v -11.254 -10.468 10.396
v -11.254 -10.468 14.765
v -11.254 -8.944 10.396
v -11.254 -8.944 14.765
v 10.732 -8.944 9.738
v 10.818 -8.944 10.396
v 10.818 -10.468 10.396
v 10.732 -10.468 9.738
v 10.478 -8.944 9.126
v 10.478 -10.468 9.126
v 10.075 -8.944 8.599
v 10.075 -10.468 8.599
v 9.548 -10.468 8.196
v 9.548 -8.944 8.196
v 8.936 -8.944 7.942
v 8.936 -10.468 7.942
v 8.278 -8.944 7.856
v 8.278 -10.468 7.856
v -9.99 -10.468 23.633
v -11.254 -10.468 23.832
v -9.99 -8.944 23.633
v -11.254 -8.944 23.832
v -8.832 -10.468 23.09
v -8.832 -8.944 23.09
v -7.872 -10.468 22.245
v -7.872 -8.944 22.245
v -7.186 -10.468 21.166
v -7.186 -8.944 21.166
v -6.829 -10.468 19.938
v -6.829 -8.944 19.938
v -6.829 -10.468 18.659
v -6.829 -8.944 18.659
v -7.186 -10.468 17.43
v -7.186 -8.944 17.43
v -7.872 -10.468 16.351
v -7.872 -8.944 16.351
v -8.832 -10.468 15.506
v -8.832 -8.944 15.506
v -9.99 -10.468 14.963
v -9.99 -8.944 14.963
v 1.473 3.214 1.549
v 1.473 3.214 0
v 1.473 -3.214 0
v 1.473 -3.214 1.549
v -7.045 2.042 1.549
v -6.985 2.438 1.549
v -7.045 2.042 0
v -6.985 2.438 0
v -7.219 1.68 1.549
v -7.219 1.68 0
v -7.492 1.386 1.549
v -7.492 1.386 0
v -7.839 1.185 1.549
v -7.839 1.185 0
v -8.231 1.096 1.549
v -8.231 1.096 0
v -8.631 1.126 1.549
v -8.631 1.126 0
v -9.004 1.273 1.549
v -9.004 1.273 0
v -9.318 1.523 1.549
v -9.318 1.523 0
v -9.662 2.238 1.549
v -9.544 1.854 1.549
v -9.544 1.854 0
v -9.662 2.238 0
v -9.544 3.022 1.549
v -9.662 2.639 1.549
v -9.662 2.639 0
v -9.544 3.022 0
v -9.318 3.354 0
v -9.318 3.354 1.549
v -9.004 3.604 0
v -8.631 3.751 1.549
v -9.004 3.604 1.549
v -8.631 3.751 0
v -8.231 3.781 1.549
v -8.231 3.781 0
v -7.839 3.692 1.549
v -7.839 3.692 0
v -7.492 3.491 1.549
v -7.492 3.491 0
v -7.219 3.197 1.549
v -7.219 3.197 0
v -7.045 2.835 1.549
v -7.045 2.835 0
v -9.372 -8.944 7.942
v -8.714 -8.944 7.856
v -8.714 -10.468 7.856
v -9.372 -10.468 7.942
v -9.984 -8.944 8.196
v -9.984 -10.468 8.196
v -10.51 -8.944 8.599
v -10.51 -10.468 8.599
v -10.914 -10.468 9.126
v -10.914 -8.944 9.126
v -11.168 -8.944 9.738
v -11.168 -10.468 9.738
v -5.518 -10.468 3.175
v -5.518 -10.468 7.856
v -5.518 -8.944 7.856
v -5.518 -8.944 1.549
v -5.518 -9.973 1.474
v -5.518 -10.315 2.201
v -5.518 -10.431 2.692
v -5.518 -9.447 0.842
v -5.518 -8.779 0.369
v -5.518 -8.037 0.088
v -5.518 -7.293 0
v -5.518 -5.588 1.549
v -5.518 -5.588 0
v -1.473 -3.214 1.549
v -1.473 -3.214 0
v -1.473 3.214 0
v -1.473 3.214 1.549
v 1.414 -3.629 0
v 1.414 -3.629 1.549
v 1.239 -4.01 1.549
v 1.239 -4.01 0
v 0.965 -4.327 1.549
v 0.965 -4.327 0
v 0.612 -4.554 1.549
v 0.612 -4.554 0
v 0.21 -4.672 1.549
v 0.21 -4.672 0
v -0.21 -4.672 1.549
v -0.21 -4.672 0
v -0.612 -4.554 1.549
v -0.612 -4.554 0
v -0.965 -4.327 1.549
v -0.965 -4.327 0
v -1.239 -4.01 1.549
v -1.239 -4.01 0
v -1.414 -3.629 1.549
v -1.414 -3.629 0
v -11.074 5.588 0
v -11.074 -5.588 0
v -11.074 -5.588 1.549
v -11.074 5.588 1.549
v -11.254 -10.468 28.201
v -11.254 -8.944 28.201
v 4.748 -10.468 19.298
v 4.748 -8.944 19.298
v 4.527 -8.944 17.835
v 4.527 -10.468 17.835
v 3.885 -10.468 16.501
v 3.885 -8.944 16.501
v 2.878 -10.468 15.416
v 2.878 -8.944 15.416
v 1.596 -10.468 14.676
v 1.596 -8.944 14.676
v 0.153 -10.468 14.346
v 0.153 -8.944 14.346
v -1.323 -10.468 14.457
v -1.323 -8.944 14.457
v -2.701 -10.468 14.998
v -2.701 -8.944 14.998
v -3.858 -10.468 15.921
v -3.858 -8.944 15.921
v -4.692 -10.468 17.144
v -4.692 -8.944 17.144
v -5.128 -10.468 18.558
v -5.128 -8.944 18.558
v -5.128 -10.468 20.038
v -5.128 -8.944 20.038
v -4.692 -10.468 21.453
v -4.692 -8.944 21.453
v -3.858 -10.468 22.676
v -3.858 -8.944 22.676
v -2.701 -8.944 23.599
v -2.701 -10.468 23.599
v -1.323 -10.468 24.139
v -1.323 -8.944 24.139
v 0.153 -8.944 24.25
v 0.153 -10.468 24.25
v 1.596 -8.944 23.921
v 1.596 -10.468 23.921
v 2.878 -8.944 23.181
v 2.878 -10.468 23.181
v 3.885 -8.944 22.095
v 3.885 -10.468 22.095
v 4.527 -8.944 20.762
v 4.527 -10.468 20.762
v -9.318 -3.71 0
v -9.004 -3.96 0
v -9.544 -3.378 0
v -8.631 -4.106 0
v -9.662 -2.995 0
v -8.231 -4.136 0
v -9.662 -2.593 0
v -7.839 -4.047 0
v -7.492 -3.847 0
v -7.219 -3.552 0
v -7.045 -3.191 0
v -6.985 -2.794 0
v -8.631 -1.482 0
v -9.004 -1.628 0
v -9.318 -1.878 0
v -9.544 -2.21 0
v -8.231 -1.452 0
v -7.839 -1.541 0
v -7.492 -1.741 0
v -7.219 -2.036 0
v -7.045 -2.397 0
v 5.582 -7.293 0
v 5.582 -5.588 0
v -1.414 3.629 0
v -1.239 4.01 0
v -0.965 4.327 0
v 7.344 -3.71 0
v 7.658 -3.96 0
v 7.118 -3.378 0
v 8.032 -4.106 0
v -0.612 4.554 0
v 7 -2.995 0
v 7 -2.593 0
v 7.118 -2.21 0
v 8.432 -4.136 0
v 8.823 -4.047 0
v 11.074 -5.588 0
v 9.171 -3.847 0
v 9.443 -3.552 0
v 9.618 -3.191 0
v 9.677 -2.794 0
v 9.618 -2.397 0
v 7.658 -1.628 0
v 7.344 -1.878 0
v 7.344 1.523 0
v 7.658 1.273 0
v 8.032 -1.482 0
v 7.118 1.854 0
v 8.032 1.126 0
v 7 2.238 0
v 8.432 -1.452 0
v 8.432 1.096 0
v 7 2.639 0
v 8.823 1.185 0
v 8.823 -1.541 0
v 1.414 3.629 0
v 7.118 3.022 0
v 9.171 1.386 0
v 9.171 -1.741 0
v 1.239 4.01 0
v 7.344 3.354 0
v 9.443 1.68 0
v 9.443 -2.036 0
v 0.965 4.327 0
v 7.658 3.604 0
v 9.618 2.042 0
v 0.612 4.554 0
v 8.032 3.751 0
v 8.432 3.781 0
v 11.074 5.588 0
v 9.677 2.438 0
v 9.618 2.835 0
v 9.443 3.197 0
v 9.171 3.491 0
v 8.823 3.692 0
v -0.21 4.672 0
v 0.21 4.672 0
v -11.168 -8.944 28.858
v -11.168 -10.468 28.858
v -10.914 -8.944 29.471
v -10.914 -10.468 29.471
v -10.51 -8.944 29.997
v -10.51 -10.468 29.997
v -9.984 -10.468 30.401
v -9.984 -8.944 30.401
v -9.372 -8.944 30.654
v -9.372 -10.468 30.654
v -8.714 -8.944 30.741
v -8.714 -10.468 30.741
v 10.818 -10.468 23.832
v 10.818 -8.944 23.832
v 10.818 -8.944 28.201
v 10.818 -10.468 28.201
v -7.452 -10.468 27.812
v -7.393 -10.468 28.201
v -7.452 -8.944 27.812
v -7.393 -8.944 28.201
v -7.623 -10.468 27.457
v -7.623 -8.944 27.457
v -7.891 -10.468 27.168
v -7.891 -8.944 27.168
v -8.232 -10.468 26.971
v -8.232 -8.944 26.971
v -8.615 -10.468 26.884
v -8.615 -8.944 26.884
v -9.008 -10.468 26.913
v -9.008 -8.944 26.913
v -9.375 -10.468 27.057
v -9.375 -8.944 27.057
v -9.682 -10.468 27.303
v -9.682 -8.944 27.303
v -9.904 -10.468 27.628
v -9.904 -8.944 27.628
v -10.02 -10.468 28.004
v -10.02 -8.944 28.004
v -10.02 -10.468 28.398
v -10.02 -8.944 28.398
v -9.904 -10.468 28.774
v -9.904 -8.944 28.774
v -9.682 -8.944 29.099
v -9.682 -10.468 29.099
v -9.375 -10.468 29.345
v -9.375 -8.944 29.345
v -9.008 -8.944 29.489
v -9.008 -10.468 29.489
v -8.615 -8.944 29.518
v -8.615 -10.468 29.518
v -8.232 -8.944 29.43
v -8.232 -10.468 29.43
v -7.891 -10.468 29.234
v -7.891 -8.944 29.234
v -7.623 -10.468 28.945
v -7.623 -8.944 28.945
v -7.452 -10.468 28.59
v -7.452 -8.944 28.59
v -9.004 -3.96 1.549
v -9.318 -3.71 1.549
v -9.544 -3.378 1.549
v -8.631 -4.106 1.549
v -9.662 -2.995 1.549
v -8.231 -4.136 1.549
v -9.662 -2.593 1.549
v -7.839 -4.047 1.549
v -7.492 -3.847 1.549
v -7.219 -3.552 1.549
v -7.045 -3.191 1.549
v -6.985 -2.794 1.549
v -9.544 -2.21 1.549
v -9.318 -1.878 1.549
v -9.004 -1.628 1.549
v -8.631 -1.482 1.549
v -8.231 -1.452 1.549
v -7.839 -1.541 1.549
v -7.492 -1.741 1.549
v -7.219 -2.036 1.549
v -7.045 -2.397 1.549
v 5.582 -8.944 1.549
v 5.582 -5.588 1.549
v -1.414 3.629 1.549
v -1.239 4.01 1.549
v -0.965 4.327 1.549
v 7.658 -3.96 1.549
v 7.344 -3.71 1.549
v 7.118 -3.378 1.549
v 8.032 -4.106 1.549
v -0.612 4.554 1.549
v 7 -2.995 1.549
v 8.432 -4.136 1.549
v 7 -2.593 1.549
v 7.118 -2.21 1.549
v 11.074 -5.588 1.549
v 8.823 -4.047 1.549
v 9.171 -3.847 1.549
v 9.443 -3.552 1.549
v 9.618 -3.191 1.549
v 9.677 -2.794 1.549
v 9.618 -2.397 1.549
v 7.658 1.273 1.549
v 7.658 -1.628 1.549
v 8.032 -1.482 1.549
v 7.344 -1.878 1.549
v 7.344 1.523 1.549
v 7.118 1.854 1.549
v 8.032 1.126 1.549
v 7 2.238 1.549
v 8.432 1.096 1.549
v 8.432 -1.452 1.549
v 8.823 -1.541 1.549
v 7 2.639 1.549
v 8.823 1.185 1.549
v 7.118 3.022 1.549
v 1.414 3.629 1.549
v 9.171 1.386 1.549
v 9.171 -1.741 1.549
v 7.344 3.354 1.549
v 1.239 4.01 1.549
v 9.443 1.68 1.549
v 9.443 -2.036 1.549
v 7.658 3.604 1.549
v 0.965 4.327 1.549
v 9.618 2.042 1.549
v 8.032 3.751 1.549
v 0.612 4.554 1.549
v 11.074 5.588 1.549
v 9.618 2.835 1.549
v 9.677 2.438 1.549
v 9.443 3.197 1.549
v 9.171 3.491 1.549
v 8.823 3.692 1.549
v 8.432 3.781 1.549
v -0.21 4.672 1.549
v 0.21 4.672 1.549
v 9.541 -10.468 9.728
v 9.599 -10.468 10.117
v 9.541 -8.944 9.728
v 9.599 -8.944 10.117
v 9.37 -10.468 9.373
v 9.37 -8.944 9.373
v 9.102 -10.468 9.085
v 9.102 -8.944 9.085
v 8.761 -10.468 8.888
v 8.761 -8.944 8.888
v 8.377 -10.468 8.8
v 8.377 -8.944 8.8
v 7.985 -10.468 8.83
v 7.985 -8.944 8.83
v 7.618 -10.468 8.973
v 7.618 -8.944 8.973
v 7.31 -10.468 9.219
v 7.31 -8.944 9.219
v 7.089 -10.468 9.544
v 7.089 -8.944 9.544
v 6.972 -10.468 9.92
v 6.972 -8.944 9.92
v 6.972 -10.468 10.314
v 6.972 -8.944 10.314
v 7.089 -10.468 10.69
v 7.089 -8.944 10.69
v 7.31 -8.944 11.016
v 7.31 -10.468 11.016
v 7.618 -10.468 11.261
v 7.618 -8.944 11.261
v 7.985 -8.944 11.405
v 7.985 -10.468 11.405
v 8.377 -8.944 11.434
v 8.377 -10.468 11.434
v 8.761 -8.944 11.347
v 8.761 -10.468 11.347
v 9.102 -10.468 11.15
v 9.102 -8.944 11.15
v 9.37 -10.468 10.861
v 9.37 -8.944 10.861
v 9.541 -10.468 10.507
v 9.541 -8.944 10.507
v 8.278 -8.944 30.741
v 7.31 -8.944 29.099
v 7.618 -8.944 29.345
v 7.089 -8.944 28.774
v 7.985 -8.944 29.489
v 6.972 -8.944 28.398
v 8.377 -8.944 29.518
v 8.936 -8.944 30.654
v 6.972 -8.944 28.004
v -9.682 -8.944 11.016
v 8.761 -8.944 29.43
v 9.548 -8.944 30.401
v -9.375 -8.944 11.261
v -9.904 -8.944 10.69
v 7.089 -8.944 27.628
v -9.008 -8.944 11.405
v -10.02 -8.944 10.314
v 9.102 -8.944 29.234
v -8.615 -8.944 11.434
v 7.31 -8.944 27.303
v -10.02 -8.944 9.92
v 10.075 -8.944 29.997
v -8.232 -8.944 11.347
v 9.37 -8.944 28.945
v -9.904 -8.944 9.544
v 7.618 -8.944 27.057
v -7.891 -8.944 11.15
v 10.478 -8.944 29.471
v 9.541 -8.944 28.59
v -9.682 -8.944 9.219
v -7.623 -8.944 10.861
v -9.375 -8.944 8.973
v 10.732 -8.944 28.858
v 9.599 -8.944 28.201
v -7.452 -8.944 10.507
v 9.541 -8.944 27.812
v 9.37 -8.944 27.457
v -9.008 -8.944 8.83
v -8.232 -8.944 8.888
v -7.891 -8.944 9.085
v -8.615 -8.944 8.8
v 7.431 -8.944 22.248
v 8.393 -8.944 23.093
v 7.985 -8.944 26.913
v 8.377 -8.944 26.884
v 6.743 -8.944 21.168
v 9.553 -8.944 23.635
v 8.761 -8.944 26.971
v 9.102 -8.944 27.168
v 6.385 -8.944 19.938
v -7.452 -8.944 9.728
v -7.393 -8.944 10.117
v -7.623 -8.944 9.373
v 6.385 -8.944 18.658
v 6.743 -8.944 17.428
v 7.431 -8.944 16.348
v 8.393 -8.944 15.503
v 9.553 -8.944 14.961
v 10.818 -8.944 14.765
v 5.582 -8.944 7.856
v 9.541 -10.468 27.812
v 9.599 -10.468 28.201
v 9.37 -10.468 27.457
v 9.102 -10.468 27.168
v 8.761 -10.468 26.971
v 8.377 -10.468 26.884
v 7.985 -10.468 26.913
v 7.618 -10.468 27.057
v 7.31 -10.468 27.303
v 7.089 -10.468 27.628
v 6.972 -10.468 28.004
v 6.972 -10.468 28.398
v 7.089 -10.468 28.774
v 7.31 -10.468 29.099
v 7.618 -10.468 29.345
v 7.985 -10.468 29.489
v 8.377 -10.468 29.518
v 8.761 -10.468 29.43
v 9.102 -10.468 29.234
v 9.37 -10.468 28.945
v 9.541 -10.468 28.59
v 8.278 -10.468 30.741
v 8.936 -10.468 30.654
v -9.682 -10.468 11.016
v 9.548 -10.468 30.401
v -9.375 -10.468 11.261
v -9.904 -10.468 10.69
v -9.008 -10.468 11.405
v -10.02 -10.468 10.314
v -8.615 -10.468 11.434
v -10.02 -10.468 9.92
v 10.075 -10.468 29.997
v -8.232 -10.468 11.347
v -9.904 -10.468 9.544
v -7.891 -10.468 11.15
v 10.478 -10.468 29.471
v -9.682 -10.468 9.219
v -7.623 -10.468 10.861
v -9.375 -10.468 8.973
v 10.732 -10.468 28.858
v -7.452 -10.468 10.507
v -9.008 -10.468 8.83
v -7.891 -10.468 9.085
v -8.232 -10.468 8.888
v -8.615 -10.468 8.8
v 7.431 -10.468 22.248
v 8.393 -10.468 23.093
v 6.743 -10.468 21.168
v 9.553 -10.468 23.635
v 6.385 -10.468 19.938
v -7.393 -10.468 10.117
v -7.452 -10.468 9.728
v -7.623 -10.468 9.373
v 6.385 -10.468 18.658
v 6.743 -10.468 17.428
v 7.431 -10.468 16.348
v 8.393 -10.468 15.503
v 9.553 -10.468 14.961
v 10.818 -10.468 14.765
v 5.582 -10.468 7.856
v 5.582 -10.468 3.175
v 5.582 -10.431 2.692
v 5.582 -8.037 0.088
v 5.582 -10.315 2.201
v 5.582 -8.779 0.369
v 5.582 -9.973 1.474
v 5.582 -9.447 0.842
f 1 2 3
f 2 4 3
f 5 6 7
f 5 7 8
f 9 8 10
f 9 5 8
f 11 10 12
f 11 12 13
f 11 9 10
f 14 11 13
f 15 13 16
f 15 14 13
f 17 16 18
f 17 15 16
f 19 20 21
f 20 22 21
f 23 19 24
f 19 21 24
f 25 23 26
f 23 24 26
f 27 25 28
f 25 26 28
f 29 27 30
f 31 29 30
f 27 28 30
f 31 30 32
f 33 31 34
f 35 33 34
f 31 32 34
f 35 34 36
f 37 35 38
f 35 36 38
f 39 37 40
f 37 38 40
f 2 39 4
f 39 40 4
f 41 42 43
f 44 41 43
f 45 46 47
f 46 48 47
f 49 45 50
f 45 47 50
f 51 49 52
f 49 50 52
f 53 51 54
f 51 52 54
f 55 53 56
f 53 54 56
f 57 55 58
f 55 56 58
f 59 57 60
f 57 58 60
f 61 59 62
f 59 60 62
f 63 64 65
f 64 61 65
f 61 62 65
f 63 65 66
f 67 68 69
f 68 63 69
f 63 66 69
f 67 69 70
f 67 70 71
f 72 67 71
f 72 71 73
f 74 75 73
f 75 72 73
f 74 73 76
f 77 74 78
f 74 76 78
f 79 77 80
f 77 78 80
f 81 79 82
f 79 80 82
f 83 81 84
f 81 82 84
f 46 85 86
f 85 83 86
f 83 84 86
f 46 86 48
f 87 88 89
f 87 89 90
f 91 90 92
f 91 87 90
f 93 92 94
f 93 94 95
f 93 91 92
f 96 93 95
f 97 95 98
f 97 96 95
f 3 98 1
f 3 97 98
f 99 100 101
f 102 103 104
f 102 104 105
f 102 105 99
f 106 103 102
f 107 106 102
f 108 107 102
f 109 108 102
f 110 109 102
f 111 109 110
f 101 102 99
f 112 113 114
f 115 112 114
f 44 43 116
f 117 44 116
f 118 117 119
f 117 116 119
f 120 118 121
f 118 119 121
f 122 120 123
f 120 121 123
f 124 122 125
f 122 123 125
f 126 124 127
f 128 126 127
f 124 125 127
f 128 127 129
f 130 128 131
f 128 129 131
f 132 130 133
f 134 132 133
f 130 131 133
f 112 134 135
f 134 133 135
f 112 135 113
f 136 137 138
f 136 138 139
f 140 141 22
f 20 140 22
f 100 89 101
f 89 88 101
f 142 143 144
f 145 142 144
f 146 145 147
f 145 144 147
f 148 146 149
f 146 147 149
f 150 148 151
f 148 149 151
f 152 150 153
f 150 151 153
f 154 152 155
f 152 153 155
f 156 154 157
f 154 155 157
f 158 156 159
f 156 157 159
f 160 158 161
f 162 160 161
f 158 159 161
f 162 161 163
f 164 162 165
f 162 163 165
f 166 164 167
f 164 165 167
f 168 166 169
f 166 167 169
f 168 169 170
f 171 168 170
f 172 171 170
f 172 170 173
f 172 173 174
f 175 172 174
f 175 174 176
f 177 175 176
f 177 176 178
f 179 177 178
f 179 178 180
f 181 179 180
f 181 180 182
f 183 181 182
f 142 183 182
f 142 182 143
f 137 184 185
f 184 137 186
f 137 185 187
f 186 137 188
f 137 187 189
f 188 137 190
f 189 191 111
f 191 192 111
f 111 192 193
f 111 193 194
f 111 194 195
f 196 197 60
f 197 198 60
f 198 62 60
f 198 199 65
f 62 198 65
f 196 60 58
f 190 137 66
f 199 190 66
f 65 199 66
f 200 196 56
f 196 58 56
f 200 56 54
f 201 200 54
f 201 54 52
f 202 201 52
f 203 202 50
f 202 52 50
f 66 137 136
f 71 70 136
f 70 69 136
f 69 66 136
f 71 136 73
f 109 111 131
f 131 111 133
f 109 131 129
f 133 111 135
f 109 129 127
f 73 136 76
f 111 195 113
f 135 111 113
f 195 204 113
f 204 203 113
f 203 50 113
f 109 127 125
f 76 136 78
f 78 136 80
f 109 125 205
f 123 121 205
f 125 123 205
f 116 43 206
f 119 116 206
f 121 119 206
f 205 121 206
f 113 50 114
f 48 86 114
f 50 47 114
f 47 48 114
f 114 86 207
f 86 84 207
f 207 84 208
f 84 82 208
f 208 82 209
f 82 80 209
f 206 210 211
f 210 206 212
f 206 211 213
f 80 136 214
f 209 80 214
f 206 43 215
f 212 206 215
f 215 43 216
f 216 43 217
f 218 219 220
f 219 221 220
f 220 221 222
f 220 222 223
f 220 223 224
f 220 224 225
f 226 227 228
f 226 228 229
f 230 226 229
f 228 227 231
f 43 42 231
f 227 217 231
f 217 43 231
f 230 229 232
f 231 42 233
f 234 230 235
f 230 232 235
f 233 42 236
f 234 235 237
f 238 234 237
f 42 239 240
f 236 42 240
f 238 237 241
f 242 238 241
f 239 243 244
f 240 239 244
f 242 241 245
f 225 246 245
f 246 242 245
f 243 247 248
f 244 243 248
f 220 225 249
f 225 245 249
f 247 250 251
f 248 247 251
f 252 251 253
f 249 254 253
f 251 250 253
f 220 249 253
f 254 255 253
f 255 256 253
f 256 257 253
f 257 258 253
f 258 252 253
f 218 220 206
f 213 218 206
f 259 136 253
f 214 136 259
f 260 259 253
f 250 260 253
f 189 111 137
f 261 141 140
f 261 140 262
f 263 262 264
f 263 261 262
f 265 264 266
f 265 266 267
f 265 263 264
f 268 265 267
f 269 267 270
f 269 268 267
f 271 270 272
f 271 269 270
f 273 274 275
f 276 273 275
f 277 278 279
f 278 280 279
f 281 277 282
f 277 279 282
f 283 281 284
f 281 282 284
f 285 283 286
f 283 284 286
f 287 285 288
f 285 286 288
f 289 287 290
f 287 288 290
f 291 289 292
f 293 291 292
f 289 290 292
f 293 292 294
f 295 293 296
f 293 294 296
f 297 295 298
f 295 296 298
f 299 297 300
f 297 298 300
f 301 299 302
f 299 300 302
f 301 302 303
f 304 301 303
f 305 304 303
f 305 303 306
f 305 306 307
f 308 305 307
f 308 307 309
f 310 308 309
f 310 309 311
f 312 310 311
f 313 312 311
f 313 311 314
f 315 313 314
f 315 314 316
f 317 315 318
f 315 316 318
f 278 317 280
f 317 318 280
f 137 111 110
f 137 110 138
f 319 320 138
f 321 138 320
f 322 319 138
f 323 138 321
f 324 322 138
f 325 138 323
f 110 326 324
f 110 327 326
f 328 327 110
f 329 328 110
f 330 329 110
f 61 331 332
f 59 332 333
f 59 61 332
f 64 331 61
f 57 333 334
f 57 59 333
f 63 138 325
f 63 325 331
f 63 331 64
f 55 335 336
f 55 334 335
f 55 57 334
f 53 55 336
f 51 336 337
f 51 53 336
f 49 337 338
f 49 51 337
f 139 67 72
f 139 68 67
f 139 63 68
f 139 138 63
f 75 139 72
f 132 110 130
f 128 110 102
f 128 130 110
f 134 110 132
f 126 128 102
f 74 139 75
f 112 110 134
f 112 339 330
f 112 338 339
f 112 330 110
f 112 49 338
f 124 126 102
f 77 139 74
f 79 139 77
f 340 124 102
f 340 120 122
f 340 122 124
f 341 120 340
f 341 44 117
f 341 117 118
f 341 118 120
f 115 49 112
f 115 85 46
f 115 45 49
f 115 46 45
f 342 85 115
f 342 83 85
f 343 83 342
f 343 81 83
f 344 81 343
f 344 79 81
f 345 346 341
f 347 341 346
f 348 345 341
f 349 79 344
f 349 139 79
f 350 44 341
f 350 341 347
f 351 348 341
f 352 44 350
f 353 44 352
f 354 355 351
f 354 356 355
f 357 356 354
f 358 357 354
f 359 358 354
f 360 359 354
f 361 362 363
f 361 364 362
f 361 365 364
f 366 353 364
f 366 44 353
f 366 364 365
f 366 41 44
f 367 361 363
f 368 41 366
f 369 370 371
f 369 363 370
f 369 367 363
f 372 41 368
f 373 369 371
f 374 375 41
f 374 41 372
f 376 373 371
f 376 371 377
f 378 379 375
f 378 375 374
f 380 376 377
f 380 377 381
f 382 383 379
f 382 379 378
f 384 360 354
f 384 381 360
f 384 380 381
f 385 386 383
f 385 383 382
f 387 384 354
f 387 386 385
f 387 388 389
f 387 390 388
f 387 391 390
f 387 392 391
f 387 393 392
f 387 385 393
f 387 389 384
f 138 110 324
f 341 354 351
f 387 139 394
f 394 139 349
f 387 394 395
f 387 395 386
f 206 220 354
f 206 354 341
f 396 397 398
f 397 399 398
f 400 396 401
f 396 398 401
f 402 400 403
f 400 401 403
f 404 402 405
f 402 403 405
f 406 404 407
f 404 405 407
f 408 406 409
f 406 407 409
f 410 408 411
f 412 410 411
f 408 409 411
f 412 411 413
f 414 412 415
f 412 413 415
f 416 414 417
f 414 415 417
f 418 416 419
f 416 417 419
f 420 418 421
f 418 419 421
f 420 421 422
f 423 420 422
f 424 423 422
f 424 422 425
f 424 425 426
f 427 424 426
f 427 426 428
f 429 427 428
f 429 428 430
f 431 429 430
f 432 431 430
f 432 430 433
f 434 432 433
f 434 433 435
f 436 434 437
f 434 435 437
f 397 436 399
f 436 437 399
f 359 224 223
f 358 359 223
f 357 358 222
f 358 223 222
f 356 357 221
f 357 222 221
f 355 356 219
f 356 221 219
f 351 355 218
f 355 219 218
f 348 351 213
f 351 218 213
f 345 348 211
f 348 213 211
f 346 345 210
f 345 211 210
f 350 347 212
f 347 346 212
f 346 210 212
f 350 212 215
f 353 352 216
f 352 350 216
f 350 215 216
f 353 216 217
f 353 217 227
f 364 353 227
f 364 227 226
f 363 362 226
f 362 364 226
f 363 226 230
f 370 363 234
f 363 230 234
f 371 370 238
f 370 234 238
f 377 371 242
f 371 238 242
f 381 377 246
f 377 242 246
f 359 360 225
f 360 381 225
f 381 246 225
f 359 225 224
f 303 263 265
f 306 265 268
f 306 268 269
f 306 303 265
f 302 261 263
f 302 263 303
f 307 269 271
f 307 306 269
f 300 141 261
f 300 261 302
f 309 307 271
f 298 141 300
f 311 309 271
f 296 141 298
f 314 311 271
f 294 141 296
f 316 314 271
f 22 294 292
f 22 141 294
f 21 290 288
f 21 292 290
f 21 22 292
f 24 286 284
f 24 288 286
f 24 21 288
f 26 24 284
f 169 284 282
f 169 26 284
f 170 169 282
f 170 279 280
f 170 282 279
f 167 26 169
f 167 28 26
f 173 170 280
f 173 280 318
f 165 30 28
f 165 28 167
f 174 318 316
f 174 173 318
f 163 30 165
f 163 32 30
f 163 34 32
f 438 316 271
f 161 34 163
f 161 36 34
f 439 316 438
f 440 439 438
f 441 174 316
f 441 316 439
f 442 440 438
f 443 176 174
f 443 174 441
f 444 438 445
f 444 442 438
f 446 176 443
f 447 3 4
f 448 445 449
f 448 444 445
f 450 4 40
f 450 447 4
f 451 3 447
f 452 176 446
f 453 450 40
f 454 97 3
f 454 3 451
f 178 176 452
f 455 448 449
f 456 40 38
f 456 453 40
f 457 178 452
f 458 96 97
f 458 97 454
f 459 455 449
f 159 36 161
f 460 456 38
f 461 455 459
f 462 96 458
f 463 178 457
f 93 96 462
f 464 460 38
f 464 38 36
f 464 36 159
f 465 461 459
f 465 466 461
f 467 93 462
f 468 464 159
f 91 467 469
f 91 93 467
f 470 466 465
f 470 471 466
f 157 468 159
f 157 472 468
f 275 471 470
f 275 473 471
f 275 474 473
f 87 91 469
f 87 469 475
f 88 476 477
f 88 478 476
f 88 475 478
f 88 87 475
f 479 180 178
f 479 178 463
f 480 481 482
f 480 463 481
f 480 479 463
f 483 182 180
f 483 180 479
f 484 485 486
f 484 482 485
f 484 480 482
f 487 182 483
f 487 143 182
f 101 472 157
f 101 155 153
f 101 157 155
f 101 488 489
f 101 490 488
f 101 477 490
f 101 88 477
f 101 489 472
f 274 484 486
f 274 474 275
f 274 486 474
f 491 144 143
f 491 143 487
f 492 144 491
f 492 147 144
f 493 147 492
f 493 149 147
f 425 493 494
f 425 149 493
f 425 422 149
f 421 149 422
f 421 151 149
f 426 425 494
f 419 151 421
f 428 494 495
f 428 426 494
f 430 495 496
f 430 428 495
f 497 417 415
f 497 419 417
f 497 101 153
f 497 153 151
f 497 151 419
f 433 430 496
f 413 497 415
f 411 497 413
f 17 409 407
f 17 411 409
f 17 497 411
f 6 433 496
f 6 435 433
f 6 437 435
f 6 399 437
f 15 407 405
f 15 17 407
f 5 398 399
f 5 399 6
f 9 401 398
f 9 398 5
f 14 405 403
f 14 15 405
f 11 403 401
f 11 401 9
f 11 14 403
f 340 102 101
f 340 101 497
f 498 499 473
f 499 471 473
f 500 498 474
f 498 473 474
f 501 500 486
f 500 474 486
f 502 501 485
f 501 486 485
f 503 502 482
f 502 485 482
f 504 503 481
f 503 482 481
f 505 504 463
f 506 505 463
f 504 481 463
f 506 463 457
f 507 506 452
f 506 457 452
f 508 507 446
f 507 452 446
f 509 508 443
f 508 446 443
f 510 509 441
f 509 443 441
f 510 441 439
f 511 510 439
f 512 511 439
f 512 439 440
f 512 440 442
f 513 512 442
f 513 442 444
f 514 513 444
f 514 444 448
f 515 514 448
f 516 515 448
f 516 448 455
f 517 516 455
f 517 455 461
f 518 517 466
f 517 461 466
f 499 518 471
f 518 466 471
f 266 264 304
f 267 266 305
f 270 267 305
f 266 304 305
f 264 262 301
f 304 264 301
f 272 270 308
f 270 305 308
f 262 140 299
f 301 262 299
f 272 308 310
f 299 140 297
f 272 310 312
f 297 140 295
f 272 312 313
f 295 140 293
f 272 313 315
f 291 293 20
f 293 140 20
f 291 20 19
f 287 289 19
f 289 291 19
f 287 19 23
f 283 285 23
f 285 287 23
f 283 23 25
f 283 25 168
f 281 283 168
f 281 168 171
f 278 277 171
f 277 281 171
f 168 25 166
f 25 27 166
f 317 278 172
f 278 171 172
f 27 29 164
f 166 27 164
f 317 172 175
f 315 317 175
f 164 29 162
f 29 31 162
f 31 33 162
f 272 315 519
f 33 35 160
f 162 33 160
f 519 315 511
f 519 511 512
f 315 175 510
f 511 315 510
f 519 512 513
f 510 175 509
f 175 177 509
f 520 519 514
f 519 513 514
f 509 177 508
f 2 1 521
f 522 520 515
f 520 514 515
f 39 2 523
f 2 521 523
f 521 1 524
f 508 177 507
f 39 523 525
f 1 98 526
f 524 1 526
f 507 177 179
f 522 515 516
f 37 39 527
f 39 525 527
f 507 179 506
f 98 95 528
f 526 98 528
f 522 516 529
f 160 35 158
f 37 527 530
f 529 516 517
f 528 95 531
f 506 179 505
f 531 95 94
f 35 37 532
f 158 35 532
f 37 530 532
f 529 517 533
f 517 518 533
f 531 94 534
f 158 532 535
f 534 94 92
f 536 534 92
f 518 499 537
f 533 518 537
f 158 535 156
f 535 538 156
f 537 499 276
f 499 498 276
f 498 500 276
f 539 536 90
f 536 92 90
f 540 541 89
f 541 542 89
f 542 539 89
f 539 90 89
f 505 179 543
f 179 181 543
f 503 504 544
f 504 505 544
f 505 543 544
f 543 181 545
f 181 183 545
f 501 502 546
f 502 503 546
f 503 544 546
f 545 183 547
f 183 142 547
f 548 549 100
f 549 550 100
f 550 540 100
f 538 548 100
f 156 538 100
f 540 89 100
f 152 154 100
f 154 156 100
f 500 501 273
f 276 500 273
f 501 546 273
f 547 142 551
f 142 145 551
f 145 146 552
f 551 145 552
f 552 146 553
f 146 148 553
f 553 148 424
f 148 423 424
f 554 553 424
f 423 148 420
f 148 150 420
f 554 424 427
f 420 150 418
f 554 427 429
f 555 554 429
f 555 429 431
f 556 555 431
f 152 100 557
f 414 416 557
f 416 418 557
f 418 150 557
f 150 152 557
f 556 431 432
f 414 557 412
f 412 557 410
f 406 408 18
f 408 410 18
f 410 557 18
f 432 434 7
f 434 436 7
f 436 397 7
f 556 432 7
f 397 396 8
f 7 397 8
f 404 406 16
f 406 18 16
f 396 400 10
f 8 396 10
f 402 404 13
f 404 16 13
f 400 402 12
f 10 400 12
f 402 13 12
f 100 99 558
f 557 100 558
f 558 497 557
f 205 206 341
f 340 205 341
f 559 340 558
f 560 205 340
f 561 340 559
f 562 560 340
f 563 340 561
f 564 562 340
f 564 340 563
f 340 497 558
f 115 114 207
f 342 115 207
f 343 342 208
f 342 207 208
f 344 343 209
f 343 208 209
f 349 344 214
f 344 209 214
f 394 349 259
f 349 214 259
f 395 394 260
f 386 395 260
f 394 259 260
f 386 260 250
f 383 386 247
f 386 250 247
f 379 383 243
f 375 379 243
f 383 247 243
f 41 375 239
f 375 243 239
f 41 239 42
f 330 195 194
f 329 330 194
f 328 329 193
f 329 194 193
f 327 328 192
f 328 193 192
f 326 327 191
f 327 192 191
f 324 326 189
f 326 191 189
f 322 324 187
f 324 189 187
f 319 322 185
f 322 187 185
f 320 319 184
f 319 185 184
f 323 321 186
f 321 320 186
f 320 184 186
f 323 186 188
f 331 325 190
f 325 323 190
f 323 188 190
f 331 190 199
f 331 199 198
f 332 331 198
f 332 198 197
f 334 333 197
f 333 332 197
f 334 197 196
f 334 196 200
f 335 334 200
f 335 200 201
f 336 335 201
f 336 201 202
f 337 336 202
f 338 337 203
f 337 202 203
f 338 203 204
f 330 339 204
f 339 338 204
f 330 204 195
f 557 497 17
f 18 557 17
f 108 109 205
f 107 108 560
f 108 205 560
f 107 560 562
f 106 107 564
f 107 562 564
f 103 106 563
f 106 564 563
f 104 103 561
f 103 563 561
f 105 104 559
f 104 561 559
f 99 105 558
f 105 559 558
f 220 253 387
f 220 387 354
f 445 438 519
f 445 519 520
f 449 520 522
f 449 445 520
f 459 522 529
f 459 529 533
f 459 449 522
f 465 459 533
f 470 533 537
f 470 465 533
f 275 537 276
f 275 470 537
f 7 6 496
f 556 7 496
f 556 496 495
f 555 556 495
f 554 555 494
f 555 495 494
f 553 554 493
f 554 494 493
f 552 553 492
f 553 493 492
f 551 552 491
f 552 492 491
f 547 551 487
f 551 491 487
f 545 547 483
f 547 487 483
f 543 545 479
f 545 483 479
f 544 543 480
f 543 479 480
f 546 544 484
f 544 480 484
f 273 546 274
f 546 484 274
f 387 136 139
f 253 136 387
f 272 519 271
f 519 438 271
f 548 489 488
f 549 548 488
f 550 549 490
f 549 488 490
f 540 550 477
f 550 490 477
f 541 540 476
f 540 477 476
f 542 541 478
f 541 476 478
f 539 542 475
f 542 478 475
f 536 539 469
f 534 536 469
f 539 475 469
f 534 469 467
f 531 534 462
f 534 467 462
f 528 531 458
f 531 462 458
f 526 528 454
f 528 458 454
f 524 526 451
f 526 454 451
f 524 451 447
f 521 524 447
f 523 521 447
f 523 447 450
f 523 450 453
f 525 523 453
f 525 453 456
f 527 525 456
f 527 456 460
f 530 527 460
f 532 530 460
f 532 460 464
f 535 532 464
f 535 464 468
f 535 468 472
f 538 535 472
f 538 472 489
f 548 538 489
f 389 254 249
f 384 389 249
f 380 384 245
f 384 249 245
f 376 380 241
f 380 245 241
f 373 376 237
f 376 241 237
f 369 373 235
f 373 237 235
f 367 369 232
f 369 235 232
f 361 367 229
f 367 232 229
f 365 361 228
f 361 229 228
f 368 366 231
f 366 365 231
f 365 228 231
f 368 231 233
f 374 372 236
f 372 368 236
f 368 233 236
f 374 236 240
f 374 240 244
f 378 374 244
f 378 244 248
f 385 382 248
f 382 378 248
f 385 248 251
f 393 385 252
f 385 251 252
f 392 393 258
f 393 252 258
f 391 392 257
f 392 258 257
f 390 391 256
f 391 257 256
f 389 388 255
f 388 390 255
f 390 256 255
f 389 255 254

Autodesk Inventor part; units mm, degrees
ref_plane "YZ Plane" through (0, 0, 0) normal (1, 0, 0) x (0, 1, 0)
ref_plane "XZ Plane" through (0, 0, 0) normal (0, 1, 0) x (-1, 0, 0)
ref_plane "XY Plane" through (0, 0, 0) normal (0, 0, 1) x (1, 0, 0)
sketch "Sketch1" plane through (0, 0, 0) normal (0, 0, 1) x (1, 0, 0)
  line L0 (-11.0744, 5.588) -> (11.0744, 5.588)
  line L1 (11.0744, 5.588) -> (11.0744, -5.588)
  line L2 (11.0744, -5.588) -> (-11.0744, -5.588)
  line L3 (-11.0744, -5.588) -> (-11.0744, 5.588)
  circle A0 centre (-8.3312, 2.4384) radius 1.3462
  circle A1 centre (8.3312, 2.4384) radius 1.3462
  circle A2 centre (8.3312, -2.794) radius 1.3462
  circle A3 centre (-8.3312, -2.794) radius 1.3462
  line L4 (0, -3.2143) -> (0, 3.2143) construction
  line L5 (1.4766, -3.2143) -> (1.4766, 3.2143)
  line L6 (-1.4766, 3.2143) -> (-1.4766, -3.2143)
  arc A4 (-1.4766, -3.2143) -> (1.4766, -3.2143) centre (0, -3.2143) ccw
  arc A5 (1.4766, 3.2143) -> (-1.4766, 3.2143) centre (0, 3.2143) ccw
  point P0 (0, 0)
  dimension "d0" = 22.1488
  dimension "d1" = 11.176
  dimension "d2" = 2.6924
  dimension "d3" = 2.6924
  dimension "d4" = 2.6924
  dimension "d5" = 2.6924
  dimension "d6" = 3.1496
  dimension "d7" = 2.794
  dimension "d8" = 5.2324
  dimension "d9" = 2.7432
  dimension "d10" = 2.7432
  dimension "d11" = 3.1496
  dimension "d12" = 2.794
extrude "Extrusion1" add sketch "Sketch1" along normal blind 1.5494 contours L0 L1 L2 L3 | A4 L6 A5 L5
sketch "Sketch2" plane through (-11.0744, -5.588, 0) normal (0, -1, 0) x (1, 0, 0)
  line L0 (5.5567, 1.5494) -> (16.6565, 1.5494)
  line L1 (16.6565, 1.5494) -> (16.6565, 0)
  line L2 (16.6565, 0) -> (5.5567, 0)
  line L3 (5.5567, 0) -> (5.5567, 1.5494)
  line L4 (22.1488, 0) -> (22.1488, 1.5494) projected
  line L5 (0, 0) -> (0, 1.5494) projected
  line L6 (22.1488, 1.5494) -> (0, 1.5494) projected
  line L7 (0, 0) -> (22.1488, 0) projected
  point P0 (11.0744, 0)
  dimension "d15" = 11.0998
  dimension "d16" = 1.5494
extrude "Extrusion2" add sketch "Sketch2" along normal blind 3.3782 contours L0 L1 L2 L3
sketch "Sketch3" plane through (-5.5177, -5.588, 1.5494) normal (0, 0, 1) x (1, 0, 0)
  line L0 (0, -3.3559) -> (11.0998, -3.3559)
  line L1 (11.0998, -3.3559) -> (11.0998, -4.8799)
  line L2 (11.0998, -4.8799) -> (0, -4.8799)
  line L3 (0, -4.8799) -> (0, -3.3559)
  point P0 (5.5177, 5.588)
  dimension "d19" = 11.0998
  dimension "d20" = 1.524
extrude "Extrusion3" add sketch "Sketch3" along normal blind 6.4008
sketch "Sketch4" plane through (-5.5177, -8.9439, 1.5494) normal (0, 1, 0) x (1, 0, 0)
  line L0 (13.7962, -29.1915) -> (-3.1964, -29.1915)
  line L1 (-3.1964, -6.3061) -> (13.7962, -6.3061)
  line L2 (-5.5567, 1.5494) -> (16.5921, 1.5494) projected
  arc A0 (-5.7364, -22.2822) -> (-5.7364, -13.2153) centre (-5.7998, -17.7488) ccw
  arc A1 (16.3362, -13.2152) -> (16.3362, -22.2823) centre (16.3912, -17.7488) ccw
  line L3 (16.3362, -8.8461) -> (16.3362, -13.2152)
  line L4 (16.3362, -22.2823) -> (16.3362, -26.6515)
  line L5 (-5.7364, -26.6515) -> (-5.7364, -22.2822)
  line L6 (-5.7364, -13.2153) -> (-5.7364, -8.8461)
  circle A2 centre (5.2999, -17.7488) radius 4.9657
  arc A3 (13.7962, -29.1915) -> (16.3362, -26.6515) centre (13.7962, -26.6515) ccw
  arc A4 (-5.7364, -26.6515) -> (-3.1964, -29.1915) centre (-3.1964, -26.6515) ccw
  arc A5 (16.3362, -8.8461) -> (13.7962, -6.3061) centre (13.7962, -8.8461) ccw
  arc A6 (-3.1964, -6.3061) -> (-5.7364, -8.8461) centre (-3.1964, -8.8461) ccw
  circle A7 centre (13.7962, -26.6515) radius 1.3208
  circle A8 centre (13.7962, -8.5679) radius 1.3208
  circle A9 centre (-3.1964, -8.5679) radius 1.3208
  circle A10 centre (-3.1964, -26.6515) radius 1.3208
  point P0 (5.5177, 1.5494)
  point P1 (-5.7364, -6.3061)
  point P2 (-5.7364, -29.1915)
  point P3 (16.3362, -6.3061)
  point P4 (5.5177, 1.5494)
  point P5 (16.3362, -17.7488)
  point P6 (5.5177, 1.5494)
  dimension "d25" = 9.0678
  dimension "d26" = 9.0678
  dimension "d27" = 9.9314
  dimension "d28" = 2.54
  dimension "d29" = 2.6416
  dimension "d30" = 2.6416
  dimension "d31" = 2.6416
  dimension "d32" = 2.6416
  dimension "d33" = 2.54
extrude "Extrusion4" add sketch "Sketch4" against normal blind 1.524
sketch "Sketch5" plane through (-11.0744, -8.9662, 0) normal (0, -1, 0) x (1, 0, 0)
  line L0 (16.6565, 1.5494) -> (5.5567, 1.5494) projected
  line L1 (5.5567, 1.5494) -> (5.5567, 0) projected
  line L2 (5.5567, 0) -> (16.6565, 0) projected
  line L3 (16.6565, 0) -> (16.6565, 1.5494) projected
  point P0 (11.0744, 0)
extrude "Extrusion5" add sketch "Sketch5" along normal blind 1.5016
fillet "Fillet1" radius 3.175 1 edges at (0.0322, -10.4678, 0)
sketch "Sketch6" plane through (0, 0, 0) normal (0, 0, -1) x (-1, 0, 0)
  line L0 (0, -3.2139) -> (0, 3.2139) construction
  line L1 (1.4732, -3.2139) -> (1.4732, 3.2139)
  line L2 (-1.4732, 3.2139) -> (-1.4732, -3.2139)
  arc A0 (-1.4732, -3.2139) -> (1.4732, -3.2139) centre (0, -3.2139) ccw
  arc A1 (1.4732, 3.2139) -> (-1.4732, 3.2139) centre (0, 3.2139) ccw
  point P0 (0, 0)
  dimension "d41" = 2.9464
extrude "Extrusion6" cut sketch "Sketch6" against normal blind 9.4615
equation "\"BendRadius\" = Thickness"
equation "\"BendReliefWidth\" = Thickness"
equation "\"BendReliefDepth\" = 0.5 * Thickness"
equation "\"CornerReliefSize\" = 4 * Thickness"
equation "\"MinimumRemnant\" = 2 * Thickness"
equation "\"TransitionRadius\" = BendRadius"
equation "\"JacobiRadiusSize\" = Thickness"
equation "\"GapSize\" = Thickness"
equation "\"Thickness\" = 3.048"
properties part number "motor mount complete"
